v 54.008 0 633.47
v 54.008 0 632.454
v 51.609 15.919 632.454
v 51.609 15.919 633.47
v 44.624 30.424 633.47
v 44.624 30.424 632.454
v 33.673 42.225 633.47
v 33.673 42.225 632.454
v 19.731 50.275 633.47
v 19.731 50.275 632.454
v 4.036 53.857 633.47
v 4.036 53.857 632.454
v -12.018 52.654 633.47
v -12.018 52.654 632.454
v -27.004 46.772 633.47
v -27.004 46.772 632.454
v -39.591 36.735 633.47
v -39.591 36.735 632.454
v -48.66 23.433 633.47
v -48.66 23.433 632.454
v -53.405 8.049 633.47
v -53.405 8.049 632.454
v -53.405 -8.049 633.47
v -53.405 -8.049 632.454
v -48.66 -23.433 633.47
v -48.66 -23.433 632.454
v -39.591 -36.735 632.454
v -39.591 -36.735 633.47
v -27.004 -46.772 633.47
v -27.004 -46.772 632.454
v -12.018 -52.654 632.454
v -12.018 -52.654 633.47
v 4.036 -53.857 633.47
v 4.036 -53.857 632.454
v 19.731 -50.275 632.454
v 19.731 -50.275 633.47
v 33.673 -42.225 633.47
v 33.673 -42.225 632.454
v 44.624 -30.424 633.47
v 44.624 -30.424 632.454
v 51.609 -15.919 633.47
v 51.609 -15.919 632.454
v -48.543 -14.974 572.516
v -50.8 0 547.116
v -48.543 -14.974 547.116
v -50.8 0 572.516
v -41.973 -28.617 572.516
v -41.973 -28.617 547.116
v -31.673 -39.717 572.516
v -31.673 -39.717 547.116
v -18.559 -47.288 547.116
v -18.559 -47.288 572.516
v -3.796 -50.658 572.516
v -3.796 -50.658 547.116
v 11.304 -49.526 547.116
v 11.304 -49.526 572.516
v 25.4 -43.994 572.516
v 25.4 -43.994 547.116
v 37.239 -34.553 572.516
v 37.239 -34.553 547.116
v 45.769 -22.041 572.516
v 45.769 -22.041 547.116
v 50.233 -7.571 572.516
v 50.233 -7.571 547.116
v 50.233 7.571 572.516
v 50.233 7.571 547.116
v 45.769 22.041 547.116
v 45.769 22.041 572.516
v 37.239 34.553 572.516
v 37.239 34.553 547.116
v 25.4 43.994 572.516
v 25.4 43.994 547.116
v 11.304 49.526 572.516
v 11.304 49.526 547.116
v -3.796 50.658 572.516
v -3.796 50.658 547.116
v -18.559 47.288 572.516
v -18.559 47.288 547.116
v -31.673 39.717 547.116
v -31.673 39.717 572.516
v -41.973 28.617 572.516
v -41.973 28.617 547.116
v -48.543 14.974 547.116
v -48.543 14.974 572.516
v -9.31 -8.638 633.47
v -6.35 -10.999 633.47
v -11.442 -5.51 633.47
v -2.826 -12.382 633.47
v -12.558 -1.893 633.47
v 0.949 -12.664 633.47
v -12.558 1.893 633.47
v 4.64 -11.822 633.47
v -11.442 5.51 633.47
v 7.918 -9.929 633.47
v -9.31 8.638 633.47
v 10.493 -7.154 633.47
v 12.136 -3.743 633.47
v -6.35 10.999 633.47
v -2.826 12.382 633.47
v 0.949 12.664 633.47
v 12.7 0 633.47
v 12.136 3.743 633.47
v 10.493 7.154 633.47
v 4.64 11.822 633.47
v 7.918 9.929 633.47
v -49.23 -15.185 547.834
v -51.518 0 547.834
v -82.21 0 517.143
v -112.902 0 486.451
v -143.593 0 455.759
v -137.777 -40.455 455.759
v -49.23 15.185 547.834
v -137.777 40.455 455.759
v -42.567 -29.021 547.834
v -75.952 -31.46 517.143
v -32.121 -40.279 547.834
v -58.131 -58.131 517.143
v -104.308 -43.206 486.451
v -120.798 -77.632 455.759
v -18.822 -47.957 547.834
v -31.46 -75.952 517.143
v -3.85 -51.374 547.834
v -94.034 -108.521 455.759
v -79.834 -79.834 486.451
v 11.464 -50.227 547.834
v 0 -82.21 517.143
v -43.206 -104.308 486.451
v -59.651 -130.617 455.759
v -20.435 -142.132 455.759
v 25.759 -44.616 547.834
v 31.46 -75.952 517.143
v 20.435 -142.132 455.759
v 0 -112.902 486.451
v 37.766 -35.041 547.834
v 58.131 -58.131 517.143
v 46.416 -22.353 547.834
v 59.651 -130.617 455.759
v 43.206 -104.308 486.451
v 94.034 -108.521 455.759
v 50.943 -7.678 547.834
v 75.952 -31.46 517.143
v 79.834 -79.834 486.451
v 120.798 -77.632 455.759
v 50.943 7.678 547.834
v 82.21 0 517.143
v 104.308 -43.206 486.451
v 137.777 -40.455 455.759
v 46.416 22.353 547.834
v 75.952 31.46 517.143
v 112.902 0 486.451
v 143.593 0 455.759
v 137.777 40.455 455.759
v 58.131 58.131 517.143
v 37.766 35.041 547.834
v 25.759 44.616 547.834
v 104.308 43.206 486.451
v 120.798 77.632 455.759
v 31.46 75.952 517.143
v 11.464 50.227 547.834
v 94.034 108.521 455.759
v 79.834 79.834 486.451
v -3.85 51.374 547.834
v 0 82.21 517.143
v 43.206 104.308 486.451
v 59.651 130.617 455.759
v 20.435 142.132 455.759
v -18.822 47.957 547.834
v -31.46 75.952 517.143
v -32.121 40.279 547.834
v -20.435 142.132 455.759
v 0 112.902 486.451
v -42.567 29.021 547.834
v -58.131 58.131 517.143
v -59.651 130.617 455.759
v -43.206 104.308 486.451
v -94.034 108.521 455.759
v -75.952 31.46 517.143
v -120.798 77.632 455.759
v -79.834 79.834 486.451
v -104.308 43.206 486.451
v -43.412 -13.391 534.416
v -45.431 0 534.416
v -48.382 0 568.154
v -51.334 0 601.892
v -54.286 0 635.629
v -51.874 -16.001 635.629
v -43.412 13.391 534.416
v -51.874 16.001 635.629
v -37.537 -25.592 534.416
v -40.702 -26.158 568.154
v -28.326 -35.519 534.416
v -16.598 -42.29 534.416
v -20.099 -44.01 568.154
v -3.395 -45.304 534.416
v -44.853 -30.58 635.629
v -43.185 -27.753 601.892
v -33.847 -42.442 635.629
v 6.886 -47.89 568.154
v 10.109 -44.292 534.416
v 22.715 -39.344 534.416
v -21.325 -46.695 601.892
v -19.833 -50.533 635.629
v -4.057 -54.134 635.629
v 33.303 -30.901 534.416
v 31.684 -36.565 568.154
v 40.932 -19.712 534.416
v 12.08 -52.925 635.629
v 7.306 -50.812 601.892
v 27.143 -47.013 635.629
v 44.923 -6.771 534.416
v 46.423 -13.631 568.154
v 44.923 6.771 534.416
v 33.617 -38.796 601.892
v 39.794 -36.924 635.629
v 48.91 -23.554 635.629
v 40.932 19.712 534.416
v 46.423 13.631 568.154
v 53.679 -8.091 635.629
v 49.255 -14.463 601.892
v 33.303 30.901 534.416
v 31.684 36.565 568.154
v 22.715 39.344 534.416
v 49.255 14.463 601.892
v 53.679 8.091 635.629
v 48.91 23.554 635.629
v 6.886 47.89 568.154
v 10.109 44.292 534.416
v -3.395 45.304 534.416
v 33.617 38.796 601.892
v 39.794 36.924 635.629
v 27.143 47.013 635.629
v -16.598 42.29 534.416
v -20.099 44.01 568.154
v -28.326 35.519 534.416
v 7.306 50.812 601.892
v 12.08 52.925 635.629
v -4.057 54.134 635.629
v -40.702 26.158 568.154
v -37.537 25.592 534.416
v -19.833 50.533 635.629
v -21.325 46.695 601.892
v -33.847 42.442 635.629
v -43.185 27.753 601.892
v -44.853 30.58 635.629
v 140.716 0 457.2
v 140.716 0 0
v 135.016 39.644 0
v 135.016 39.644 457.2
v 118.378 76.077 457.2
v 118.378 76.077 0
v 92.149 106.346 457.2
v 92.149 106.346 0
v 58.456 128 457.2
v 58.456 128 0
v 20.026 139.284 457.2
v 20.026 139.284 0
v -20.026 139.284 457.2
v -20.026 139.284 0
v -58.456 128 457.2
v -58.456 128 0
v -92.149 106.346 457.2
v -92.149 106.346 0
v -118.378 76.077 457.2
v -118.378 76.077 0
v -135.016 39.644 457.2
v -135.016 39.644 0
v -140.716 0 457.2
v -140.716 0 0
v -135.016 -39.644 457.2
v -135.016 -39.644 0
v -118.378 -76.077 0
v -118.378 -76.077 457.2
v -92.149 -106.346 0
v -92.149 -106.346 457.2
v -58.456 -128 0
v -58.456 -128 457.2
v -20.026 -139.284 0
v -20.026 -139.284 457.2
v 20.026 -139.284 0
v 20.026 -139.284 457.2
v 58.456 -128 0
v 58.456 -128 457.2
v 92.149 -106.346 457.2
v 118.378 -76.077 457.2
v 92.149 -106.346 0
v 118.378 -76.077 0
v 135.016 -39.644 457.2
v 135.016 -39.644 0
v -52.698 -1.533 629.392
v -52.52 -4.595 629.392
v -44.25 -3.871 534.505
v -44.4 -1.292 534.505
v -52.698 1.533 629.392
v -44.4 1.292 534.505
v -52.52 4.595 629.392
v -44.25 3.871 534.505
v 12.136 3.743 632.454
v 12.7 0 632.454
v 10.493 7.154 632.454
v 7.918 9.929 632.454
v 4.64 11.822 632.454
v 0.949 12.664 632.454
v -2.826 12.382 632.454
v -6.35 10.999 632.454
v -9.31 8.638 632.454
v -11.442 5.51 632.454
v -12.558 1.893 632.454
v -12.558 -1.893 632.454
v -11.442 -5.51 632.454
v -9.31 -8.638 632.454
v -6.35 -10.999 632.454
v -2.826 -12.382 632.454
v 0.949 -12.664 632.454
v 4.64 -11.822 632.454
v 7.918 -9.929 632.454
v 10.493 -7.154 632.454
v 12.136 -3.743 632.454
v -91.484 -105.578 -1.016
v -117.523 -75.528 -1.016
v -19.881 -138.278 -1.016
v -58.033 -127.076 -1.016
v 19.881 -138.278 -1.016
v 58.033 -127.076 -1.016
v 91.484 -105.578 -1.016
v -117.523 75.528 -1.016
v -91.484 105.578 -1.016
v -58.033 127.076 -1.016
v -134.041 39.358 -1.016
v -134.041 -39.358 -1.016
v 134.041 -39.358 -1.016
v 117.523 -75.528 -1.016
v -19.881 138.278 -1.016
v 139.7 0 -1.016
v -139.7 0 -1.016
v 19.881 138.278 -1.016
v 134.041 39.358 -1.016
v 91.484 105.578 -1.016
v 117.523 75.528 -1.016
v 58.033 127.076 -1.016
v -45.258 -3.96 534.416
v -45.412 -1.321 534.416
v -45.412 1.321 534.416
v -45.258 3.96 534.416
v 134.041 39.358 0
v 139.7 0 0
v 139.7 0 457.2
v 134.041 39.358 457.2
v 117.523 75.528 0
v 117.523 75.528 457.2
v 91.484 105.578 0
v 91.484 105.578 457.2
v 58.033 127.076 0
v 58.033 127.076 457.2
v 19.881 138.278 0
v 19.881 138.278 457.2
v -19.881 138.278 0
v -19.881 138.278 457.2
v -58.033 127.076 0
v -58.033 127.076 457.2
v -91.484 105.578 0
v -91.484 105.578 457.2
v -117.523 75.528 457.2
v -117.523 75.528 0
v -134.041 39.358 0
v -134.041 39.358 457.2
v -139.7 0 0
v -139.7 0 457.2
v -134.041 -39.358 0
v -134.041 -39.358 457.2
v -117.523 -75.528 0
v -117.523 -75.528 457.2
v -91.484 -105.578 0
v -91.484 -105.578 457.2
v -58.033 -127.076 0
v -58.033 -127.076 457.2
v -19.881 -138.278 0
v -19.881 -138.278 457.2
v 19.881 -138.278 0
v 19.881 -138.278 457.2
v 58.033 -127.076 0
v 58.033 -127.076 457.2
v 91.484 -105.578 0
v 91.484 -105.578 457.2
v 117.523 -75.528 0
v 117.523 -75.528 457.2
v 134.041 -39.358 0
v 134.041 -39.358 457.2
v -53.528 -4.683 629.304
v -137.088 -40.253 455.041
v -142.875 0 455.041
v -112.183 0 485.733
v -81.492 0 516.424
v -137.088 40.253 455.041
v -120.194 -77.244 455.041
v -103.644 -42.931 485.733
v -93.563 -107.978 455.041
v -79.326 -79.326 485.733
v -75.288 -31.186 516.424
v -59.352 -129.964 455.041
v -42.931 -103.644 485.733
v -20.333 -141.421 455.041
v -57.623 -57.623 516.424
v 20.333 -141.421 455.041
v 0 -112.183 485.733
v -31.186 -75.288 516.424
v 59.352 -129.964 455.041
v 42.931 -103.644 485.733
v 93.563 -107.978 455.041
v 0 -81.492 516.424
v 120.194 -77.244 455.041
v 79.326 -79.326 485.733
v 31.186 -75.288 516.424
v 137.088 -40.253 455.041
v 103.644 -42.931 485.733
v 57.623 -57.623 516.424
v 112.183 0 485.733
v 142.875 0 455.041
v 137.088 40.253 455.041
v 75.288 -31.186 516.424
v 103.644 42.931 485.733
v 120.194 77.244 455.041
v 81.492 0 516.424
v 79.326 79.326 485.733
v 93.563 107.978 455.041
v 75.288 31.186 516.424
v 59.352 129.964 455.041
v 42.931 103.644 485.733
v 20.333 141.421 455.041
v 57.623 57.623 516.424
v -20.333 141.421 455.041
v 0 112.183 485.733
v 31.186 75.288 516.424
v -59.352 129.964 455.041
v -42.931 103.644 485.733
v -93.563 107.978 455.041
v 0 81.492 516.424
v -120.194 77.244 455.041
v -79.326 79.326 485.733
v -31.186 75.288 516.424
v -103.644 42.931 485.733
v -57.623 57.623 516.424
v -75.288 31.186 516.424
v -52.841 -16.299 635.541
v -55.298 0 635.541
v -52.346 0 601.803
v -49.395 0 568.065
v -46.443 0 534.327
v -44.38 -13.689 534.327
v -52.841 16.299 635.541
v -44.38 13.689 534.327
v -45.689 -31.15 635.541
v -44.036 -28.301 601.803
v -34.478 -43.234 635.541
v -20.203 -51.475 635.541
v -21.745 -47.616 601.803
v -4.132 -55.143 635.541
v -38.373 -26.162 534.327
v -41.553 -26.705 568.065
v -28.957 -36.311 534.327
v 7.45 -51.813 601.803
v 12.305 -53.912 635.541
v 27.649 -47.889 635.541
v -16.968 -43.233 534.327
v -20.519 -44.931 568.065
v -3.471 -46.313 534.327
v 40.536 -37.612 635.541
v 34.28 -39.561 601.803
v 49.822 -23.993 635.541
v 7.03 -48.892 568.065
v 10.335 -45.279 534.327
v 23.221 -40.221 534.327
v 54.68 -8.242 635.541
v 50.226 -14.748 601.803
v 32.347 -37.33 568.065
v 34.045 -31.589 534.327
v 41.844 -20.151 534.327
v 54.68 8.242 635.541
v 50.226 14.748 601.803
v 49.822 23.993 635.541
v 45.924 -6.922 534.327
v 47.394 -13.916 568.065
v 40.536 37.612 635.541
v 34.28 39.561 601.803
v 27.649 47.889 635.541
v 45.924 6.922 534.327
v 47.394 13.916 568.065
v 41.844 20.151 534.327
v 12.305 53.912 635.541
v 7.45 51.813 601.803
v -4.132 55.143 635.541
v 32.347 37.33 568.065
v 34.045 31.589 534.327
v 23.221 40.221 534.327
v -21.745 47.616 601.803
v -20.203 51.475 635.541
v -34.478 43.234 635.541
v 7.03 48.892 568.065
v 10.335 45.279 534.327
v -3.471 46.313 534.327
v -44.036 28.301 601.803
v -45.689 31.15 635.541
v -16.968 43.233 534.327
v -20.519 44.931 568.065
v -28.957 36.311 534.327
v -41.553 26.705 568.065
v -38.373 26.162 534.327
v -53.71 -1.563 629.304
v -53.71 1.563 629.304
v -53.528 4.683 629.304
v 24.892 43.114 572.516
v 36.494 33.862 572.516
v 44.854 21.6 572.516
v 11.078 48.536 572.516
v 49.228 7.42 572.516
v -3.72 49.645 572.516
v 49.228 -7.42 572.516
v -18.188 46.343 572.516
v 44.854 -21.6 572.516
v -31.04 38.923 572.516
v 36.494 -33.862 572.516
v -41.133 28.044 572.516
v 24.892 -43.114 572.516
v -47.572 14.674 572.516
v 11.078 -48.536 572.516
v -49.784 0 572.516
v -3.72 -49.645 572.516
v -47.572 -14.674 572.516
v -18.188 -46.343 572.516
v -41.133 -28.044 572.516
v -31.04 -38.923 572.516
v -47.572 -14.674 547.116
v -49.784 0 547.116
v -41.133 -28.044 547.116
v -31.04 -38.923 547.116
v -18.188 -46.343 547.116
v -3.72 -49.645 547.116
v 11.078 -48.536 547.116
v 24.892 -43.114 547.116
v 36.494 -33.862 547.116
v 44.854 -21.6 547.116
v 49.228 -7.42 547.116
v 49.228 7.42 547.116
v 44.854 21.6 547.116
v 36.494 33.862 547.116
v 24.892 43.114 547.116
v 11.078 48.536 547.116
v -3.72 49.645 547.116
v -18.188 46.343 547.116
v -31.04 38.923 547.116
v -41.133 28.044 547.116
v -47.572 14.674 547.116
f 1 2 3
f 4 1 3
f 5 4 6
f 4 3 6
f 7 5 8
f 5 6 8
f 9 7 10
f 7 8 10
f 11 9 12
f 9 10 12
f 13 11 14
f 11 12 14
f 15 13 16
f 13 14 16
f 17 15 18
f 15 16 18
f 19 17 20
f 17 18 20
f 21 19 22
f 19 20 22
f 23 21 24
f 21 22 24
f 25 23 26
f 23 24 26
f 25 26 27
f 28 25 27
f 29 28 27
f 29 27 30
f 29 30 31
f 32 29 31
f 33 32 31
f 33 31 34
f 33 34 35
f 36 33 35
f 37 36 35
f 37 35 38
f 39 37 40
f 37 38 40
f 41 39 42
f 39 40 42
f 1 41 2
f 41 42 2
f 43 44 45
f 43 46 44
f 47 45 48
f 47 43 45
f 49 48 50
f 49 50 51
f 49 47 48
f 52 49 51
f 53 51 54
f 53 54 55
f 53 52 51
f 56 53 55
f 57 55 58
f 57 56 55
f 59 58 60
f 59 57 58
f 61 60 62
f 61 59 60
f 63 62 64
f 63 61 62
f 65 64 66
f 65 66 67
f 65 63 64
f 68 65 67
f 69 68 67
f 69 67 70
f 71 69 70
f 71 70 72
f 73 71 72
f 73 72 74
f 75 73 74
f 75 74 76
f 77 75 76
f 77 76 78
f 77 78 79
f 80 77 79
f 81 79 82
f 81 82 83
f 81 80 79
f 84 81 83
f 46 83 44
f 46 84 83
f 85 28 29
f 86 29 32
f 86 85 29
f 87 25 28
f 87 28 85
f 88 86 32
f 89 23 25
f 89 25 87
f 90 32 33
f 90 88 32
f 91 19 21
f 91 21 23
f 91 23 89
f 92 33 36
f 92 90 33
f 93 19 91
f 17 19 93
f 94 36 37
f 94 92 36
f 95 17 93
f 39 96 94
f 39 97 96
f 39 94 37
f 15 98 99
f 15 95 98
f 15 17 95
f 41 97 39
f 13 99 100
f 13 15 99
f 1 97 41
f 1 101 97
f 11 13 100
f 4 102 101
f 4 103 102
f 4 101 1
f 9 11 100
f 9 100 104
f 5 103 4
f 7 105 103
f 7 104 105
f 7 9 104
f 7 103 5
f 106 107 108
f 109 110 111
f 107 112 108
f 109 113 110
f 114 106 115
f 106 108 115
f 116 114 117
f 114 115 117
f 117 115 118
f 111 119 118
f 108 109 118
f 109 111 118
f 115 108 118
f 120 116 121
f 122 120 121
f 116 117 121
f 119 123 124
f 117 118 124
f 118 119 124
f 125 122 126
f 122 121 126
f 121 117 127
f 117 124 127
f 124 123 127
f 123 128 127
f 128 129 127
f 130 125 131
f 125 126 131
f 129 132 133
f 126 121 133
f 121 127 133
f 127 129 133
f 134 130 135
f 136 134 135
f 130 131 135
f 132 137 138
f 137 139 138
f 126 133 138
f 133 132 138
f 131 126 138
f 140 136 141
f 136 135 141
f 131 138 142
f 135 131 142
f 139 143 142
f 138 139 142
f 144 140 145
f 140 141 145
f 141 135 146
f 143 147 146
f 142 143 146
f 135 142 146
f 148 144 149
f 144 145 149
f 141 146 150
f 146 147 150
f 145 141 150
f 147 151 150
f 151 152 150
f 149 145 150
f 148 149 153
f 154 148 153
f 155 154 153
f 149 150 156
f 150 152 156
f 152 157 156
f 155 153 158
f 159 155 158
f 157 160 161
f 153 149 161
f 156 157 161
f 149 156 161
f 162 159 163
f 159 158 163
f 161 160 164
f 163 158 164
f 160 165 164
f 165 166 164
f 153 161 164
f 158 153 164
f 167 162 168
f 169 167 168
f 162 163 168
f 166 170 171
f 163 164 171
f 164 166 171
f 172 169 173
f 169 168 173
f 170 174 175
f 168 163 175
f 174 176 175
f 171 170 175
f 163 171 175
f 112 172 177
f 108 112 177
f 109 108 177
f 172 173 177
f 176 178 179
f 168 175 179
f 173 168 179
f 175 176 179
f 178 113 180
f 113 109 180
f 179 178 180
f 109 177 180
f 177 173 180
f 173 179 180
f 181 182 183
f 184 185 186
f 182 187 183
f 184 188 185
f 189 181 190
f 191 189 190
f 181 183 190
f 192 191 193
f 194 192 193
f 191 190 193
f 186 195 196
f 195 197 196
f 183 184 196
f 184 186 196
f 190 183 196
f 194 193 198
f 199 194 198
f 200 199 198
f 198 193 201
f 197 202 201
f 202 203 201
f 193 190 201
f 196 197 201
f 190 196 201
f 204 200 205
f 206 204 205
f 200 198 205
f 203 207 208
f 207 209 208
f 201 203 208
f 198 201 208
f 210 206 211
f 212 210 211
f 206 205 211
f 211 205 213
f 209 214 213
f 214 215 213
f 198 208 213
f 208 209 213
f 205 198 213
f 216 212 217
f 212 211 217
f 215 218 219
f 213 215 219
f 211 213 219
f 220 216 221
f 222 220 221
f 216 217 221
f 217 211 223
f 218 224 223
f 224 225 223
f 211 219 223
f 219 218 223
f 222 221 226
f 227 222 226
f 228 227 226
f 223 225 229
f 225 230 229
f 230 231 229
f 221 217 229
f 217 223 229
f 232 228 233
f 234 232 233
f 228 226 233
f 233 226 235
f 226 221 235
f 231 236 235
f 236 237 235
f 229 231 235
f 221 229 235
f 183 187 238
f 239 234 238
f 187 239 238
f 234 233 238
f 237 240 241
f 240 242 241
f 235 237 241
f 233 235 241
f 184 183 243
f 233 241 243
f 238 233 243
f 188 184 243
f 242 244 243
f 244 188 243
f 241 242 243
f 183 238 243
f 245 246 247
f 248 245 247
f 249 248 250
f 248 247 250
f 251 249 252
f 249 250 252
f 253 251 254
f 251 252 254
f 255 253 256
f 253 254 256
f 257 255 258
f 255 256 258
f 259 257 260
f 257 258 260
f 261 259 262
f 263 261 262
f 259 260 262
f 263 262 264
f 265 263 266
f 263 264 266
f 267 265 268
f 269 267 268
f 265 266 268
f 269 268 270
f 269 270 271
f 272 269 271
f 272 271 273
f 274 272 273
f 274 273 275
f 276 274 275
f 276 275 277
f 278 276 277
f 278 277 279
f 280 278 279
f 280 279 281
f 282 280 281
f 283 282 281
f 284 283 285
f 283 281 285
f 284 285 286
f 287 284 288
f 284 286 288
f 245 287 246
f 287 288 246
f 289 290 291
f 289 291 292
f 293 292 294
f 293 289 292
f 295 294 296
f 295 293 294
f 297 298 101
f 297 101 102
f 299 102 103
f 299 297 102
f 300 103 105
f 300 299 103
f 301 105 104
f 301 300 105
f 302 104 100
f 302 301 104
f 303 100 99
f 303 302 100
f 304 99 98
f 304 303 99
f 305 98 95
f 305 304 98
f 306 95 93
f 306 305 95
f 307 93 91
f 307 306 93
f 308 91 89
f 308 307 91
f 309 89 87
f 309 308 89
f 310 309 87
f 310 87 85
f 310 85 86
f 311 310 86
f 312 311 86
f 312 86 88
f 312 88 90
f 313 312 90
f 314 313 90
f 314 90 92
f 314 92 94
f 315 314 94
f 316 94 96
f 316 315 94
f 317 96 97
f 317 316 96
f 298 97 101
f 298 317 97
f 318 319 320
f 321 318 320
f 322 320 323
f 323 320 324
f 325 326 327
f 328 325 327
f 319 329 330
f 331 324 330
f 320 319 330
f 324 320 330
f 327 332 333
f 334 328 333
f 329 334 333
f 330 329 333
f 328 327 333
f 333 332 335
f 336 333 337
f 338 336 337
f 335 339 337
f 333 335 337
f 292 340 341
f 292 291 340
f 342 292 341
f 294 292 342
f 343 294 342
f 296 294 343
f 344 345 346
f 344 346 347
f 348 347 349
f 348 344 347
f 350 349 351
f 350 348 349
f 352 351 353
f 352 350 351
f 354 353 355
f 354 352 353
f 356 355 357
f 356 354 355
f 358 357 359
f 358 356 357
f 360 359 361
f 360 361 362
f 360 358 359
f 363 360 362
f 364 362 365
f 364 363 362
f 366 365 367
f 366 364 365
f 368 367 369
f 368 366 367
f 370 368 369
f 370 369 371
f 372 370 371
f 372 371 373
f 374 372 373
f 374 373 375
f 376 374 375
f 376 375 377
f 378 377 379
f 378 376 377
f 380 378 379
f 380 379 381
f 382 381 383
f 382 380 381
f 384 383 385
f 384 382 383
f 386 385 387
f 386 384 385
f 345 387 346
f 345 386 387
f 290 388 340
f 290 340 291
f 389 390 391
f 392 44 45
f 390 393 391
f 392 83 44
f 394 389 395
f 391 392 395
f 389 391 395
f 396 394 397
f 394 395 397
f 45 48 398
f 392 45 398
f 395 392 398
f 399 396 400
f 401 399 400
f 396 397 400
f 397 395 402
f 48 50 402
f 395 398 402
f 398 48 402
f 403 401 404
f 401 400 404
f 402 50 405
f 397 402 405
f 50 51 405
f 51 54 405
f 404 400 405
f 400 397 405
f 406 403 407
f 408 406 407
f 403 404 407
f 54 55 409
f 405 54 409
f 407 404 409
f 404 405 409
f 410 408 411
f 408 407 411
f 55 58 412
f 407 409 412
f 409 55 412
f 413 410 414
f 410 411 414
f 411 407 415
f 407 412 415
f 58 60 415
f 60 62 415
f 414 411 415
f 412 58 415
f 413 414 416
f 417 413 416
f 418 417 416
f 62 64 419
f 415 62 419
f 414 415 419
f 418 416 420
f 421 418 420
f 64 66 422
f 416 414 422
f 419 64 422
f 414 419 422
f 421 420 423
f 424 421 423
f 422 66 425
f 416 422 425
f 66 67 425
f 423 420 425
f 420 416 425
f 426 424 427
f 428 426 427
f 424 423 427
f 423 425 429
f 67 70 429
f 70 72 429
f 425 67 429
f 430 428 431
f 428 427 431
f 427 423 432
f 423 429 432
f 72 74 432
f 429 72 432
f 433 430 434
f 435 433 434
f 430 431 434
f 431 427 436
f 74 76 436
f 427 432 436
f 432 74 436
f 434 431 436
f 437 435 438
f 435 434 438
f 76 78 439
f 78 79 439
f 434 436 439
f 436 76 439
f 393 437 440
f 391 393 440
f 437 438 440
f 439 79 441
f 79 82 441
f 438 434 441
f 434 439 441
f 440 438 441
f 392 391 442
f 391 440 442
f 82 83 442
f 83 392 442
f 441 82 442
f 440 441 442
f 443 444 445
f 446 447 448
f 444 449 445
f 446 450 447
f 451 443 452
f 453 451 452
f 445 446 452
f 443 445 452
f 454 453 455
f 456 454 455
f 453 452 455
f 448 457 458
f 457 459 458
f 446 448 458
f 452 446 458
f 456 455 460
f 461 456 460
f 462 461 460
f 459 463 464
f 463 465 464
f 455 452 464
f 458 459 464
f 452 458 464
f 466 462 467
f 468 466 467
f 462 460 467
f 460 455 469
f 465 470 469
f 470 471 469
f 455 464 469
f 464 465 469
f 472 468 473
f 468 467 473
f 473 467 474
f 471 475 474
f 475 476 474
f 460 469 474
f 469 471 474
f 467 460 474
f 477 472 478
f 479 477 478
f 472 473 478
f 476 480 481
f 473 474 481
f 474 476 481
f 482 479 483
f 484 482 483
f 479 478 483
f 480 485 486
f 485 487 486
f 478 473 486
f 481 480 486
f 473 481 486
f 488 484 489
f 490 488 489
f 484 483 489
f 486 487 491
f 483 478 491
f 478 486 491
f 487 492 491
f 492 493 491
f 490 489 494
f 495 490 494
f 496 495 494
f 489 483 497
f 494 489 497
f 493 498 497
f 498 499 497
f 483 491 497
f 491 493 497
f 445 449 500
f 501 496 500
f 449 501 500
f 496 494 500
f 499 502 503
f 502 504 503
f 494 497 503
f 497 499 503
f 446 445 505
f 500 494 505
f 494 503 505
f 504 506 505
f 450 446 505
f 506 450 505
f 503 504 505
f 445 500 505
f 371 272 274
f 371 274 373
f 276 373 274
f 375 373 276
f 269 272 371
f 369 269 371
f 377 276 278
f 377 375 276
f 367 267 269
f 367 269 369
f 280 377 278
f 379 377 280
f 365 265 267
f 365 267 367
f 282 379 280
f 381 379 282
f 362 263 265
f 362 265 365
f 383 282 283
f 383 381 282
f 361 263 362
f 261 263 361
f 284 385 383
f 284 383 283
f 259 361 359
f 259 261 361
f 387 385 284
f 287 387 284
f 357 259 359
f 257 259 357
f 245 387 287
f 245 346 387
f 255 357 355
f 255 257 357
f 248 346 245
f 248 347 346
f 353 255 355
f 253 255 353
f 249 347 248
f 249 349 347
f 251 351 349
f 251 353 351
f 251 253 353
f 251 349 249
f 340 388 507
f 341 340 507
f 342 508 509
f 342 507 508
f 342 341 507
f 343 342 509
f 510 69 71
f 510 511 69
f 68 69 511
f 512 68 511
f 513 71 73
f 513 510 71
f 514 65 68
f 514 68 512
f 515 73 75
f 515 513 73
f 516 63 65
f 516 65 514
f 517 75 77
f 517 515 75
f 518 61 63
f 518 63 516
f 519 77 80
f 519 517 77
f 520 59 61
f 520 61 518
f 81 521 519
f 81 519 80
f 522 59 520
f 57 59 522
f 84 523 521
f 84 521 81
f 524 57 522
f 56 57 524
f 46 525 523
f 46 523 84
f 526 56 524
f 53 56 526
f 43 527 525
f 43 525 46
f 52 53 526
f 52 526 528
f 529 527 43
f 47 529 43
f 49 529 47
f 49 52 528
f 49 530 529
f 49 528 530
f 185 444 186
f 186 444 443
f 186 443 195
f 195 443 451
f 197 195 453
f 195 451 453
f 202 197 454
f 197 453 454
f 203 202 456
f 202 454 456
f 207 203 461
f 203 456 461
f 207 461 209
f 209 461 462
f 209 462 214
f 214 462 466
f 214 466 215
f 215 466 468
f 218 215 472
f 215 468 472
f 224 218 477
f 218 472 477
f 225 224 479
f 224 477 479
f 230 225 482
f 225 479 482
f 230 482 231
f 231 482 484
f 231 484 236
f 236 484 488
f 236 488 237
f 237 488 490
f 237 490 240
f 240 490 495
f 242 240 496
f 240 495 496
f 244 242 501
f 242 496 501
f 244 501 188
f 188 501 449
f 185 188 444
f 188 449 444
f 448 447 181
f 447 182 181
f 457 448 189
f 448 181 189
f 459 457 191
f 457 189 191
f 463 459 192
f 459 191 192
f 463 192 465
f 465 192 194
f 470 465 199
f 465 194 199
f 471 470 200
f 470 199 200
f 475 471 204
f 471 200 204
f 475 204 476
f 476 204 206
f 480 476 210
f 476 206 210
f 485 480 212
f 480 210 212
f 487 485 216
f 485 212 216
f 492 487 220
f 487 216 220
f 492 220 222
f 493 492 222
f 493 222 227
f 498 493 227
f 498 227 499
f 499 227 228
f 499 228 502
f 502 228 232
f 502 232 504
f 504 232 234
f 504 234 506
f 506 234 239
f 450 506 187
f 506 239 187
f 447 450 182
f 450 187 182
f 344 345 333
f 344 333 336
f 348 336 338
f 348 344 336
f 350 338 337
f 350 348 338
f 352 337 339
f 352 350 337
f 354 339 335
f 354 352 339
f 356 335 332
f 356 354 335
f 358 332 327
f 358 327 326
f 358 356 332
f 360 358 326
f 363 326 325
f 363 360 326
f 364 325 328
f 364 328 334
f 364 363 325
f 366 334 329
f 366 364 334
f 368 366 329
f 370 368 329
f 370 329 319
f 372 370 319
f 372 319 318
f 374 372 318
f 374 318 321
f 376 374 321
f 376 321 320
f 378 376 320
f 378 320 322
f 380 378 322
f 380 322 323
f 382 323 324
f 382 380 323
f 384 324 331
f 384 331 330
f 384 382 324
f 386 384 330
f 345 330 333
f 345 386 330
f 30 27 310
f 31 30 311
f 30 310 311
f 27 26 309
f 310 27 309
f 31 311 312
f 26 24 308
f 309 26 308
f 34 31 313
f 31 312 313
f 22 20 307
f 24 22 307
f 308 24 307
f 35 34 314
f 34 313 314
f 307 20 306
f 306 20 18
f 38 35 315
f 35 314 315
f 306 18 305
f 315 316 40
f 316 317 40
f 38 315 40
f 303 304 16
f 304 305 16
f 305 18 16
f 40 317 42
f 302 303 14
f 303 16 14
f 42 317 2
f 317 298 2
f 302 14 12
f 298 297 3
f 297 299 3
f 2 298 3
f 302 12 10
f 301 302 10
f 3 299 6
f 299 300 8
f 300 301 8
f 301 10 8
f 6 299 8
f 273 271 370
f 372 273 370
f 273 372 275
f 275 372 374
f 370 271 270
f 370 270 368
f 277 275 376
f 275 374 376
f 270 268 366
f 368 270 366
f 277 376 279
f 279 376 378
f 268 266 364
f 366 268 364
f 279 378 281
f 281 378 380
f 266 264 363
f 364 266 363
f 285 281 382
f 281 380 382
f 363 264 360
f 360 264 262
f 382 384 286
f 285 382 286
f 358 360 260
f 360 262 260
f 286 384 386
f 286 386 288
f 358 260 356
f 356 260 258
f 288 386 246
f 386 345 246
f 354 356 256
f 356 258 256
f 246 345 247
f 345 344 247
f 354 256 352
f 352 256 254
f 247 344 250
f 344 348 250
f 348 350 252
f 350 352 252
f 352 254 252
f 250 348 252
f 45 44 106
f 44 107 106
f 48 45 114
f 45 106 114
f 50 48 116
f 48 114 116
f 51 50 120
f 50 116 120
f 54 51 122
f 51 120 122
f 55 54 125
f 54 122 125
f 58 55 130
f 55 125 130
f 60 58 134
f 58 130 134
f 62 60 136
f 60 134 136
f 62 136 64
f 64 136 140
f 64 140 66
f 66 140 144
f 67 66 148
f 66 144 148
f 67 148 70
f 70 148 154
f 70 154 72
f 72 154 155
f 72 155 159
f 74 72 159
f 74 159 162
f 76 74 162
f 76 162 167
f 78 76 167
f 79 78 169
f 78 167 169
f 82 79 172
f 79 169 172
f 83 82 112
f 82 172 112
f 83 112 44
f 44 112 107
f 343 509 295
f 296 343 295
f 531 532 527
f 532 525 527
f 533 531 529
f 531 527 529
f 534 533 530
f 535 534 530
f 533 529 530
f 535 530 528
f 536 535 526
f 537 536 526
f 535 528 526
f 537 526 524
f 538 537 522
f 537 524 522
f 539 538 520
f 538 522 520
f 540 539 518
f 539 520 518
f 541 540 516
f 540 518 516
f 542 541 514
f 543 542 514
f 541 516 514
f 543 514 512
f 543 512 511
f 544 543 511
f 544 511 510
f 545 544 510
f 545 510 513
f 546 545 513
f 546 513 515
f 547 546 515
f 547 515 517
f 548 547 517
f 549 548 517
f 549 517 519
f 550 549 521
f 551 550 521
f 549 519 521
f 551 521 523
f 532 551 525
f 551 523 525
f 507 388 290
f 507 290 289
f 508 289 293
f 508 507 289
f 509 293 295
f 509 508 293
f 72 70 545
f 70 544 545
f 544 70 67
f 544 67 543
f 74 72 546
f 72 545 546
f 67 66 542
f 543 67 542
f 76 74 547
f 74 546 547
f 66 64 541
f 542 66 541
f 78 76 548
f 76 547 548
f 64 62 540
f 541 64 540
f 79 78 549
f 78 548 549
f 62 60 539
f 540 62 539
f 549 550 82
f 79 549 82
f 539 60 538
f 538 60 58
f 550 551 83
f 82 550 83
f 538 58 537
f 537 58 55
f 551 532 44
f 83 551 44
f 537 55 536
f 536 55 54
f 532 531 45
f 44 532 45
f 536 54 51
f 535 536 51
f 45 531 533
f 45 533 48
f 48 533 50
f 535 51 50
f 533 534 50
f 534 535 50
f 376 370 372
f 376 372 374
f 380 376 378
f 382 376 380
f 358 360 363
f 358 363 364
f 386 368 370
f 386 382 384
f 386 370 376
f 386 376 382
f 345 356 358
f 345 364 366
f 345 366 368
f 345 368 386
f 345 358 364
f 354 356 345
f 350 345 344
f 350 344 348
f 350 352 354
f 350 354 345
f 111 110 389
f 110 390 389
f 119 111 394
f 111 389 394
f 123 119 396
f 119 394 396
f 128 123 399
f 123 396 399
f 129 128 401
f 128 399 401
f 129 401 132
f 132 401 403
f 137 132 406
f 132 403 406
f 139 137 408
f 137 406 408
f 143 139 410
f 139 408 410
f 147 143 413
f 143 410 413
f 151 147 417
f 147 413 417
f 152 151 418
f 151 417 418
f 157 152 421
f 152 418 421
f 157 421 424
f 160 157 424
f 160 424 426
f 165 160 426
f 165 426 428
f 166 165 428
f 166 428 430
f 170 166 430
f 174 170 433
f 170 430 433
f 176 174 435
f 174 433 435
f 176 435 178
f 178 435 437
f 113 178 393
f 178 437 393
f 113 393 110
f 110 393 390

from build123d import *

# Parameters (mm, degrees)
F0_R      = 139.7
F1_DEPTH  = 1.016
F2_R      = 140.716
F2_R_2    = 139.7
F3_DEPTH  = 457.2
F6_W      = 1.016
F6_H      = 25.4
F12_R     = 54.008048
F12_R_2   = 12.7
F13_DEPTH = 1.016
F15_ANGLE = 10


with BuildPart() as f1:
    # F0 (on Top) → F1 (new body)
    with BuildSketch(Plane.XY):
        Circle(F0_R)
    extrude(amount=-F1_DEPTH)


with BuildPart() as f3:
    # F2 (on face) → F3 (new body)
    with BuildSketch(Plane.XY):
        Circle(F2_R)
        Circle(F2_R_2, mode=Mode.SUBTRACT)
    extrude(amount=F3_DEPTH)


with BuildPart() as f5:
    # F4 (on Front) → F5 (revolve)
    with BuildSketch(Plane.XZ):
        Polygon((-143.59342, 455.75942), (-142.875, 455.041), (-50.8, 547.116), (-51.51842, 547.83442), align=None)
    revolve(axis=Axis((0, 0, 296.564102), (0, 0, 1)))


with BuildPart() as f7:
    # F6 (on Front) → F7 (revolve)
    with BuildSketch(Plane.XZ):
        with Locations((-50.292, 559.816)):
            Rectangle(F6_W, F6_H)
    revolve(axis=Axis((0, 0, 315.481633), (0, 0, 1)))


with BuildPart() as f9:
    # F8 (on Front) → F9 (revolve)
    with BuildSketch(Plane.XZ):
        Polygon((-54.285824, 635.629381), (-55.297958, 635.540831), (-46.442935, 534.32745), (-45.430801, 534.416), align=None)
    revolve(axis=Axis((0, 0, 317.814691), (0, 0, 1)))


with BuildPart() as f13:
    # F12 (on offset) → F13 (new body)
    with BuildSketch(Plane.XY.offset(632.454381)):
        Circle(F12_R)
        Circle(F12_R_2, mode=Mode.SUBTRACT)
    extrude(amount=F13_DEPTH)


with BuildPart() as f15:
    # F14 (on Front) → F15 (revolve, symmetric)
    with BuildSketch(Plane.XZ) as f15_sk:
        Polygon((-52.720252, 629.392095), (-53.732385, 629.303545), (-45.430801, 534.416), (-44.418667, 534.50455), align=None)
    revolve(axis=Axis((0, 0, 347.863972), (0, 0, 1)), revolution_arc=F15_ANGLE / 2)
    revolve(f15_sk.sketch, axis=Axis((0, 0, 347.863972), (0, 0, -1)), revolution_arc=F15_ANGLE / 2)


solid = Compound([f1.part, f3.part, f5.part, f7.part, f9.part, f13.part, f15.part])
